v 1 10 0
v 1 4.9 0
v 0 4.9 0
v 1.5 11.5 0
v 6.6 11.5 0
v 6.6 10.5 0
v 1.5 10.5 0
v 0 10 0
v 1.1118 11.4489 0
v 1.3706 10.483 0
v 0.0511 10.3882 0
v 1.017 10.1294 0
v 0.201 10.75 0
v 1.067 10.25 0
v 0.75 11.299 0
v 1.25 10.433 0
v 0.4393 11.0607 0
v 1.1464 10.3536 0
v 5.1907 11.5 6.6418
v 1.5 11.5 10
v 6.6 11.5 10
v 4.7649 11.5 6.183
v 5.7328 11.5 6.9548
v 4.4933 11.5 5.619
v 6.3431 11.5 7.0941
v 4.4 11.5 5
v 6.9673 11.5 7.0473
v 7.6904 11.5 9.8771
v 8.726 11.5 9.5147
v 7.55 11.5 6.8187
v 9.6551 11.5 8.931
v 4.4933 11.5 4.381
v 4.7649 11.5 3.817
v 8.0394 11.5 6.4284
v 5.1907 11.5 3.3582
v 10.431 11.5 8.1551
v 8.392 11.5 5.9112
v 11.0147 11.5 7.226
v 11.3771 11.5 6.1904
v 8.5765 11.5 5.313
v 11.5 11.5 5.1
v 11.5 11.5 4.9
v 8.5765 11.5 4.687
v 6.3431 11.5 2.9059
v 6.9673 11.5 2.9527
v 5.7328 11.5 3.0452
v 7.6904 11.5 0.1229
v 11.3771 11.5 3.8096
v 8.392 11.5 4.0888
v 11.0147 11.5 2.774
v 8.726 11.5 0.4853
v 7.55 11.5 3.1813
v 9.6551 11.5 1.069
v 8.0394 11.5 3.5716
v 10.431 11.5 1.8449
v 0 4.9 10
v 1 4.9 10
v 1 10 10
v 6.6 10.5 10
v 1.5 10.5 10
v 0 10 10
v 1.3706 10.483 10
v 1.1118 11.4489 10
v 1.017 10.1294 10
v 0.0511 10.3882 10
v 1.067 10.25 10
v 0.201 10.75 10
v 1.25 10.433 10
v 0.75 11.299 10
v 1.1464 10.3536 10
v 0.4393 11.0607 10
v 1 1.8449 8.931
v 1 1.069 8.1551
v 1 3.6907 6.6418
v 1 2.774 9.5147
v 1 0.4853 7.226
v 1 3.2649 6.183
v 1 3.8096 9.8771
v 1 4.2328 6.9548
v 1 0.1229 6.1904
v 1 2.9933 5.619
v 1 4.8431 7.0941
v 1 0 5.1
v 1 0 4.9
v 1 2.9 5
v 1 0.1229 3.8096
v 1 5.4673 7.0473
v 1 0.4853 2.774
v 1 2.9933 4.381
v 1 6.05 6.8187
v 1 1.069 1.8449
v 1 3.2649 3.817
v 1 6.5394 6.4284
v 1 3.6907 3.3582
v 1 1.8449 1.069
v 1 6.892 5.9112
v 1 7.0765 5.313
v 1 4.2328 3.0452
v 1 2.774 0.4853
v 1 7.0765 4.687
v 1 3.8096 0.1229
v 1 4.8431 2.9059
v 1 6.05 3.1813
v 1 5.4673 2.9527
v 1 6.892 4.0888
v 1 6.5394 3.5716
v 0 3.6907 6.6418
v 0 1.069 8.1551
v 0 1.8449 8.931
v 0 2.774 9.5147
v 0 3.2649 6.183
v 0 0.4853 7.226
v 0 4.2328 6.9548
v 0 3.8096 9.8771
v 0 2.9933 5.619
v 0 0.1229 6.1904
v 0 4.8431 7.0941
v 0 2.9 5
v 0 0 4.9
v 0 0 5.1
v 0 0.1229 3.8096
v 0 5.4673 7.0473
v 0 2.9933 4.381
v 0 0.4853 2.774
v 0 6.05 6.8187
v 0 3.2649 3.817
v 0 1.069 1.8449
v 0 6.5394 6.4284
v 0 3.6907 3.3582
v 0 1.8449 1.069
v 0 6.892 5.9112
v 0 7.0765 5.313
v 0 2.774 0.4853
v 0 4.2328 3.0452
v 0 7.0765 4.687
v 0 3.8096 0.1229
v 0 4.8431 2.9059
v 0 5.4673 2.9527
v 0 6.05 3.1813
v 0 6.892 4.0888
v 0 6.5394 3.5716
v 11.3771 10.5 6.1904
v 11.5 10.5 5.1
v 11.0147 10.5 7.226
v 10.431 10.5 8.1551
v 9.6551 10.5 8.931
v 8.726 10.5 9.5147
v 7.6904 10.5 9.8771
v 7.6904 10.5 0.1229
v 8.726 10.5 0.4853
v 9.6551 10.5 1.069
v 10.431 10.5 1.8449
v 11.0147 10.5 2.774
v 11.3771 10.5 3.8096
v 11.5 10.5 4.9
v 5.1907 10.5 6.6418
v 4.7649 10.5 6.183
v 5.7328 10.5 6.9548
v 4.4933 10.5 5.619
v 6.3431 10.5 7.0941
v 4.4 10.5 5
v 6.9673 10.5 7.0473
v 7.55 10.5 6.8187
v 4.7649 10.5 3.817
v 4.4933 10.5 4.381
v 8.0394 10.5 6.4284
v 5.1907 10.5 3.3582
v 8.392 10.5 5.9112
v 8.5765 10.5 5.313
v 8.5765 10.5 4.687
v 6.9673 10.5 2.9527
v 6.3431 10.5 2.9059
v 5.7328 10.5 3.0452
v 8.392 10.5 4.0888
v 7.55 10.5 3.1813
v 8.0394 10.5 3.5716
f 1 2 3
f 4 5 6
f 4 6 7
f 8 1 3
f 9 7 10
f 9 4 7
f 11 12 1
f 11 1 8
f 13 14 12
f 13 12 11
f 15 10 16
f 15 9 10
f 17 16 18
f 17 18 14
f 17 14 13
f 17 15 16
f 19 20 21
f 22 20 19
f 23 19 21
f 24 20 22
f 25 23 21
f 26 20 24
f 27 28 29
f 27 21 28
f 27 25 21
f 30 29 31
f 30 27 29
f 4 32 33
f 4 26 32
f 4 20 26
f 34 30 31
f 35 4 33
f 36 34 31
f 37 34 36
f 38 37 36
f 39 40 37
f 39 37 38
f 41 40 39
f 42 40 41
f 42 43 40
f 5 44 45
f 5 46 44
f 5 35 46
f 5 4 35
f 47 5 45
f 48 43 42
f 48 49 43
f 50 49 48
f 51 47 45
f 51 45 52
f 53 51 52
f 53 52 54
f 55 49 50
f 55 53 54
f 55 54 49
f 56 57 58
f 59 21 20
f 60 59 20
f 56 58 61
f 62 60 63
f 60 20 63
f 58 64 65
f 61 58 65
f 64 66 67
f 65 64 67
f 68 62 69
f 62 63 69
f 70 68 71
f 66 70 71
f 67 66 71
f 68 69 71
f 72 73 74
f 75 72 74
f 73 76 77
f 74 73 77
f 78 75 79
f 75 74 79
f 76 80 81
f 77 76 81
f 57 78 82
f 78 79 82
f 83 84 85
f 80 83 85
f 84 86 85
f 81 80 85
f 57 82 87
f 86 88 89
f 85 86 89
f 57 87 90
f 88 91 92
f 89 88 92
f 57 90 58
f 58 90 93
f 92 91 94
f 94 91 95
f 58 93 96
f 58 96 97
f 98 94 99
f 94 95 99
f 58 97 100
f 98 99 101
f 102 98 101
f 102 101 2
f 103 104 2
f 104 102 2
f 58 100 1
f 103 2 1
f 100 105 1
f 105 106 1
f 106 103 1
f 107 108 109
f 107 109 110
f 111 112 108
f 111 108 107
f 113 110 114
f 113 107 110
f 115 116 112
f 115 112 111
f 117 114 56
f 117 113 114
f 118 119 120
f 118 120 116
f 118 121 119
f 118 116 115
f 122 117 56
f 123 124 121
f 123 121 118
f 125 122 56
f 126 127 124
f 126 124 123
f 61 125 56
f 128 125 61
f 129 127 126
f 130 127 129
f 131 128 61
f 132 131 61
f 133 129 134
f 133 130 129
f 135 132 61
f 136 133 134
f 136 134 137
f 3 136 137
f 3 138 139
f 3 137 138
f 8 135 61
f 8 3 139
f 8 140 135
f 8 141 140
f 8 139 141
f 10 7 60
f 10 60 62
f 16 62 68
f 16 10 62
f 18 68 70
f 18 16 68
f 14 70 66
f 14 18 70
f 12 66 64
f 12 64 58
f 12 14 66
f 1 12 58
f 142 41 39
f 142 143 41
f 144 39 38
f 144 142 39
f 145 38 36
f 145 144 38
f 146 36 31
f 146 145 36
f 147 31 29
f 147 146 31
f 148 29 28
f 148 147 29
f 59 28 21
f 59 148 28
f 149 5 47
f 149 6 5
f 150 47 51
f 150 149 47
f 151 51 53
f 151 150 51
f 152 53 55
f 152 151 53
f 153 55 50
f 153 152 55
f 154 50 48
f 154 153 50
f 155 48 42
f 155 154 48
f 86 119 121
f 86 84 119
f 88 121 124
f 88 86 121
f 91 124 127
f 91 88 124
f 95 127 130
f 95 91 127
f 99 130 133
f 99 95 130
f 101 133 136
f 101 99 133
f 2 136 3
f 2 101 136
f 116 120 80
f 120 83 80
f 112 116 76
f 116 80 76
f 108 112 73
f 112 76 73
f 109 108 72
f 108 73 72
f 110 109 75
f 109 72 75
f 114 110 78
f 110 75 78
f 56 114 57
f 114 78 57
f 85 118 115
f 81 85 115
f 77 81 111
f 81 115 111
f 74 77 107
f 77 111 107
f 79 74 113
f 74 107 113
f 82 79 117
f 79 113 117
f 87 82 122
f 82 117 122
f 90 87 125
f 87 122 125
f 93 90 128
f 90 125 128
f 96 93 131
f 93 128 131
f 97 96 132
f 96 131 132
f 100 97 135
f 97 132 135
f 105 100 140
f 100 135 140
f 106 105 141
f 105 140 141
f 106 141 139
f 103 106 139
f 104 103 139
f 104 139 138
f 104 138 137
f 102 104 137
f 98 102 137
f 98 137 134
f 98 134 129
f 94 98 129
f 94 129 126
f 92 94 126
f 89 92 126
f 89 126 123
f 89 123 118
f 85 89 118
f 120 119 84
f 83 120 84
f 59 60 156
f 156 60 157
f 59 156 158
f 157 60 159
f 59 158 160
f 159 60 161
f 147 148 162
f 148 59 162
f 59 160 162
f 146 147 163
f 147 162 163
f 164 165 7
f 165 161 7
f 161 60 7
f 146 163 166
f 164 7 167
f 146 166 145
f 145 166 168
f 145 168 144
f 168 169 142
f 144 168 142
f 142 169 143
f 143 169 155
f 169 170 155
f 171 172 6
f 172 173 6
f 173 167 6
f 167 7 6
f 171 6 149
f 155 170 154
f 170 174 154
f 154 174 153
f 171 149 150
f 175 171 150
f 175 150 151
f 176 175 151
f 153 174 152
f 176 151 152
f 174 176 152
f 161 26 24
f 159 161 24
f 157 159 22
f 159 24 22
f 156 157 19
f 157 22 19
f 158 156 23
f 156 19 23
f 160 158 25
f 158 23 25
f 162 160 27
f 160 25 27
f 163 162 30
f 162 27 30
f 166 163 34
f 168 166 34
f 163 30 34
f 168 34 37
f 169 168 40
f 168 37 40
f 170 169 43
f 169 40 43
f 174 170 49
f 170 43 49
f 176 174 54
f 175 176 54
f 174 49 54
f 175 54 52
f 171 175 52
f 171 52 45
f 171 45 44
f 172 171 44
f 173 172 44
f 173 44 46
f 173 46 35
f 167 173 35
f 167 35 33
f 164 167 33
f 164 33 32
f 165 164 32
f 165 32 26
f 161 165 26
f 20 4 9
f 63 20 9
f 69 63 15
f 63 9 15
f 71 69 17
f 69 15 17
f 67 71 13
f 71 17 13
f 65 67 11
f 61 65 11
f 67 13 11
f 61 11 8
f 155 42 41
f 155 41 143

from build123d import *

# Parameters (mm, degrees)
PAD_DEPTH       = 10
FILLET_R        = 4.9
FILLET001_R     = 4.9
FILLET002_R     = 4.9
FILLET003_R     = 4.9
SKETCH001_R     = 2.1
POCKET_DEPTH    = 11.501
SKETCH002_R     = 2.1
POCKET001_DEPTH = 11.501


with BuildPart() as part:
    # Sketch → Pad (new body)
    with BuildSketch(Plane.XY):
        with BuildLine():
            Line((0, 0), (0, 10))
            ThreePointArc((1.5, 11.5), (0.43934, 11.06066), (0, 10))
            Line((1.5, 11.5), (11.5, 11.5))
            Line((11.5, 11.5), (11.5, 10.5))
            Line((1.5, 10.5), (11.5, 10.5))
            ThreePointArc((1.5, 10.5), (1.146447, 10.353553), (1, 10))
            Line((1, 0), (1, 10))
            Line((0, 0), (1, 0))
        make_face()
    extrude(amount=PAD_DEPTH)

    # Fillet
    fillet_edges = [part.edges().sort_by_distance(p)[0] for p in [
        (0.5, 0, 10),
    ]]
    fillet(fillet_edges, radius=FILLET_R)

    # Fillet001
    fillet001_edges = [part.edges().sort_by_distance(p)[0] for p in [
        (0.5, 0, 0),
    ]]
    fillet(fillet001_edges, radius=FILLET001_R)

    # Fillet002
    fillet002_edges = [part.edges().sort_by_distance(p)[0] for p in [
        (11.5, 11, 0),
    ]]
    fillet(fillet002_edges, radius=FILLET002_R)

    # Fillet003
    fillet003_edges = [part.edges().sort_by_distance(p)[0] for p in [
        (11.5, 11, 10),
    ]]
    fillet(fillet003_edges, radius=FILLET003_R)

    # Sketch001 → Pocket (cut, through all)
    with BuildSketch(Plane(origin=(0, 0, 0), x_dir=(0, -1, 0), z_dir=(-1, 0, 0))):
        with Locations((-5, 5)):
            Circle(SKETCH001_R)
    extrude(amount=-POCKET_DEPTH, mode=Mode.SUBTRACT)

    # Sketch002 → Pocket001 (cut, through all)
    with BuildSketch(Plane(origin=(0, 11.5, 0), x_dir=(-1, 0, 0), z_dir=(0, 1, 0))):
        with Locations((-6.5, 5)):
            Circle(SKETCH002_R)
    extrude(amount=-POCKET001_DEPTH, mode=Mode.SUBTRACT)


solid = part.part
